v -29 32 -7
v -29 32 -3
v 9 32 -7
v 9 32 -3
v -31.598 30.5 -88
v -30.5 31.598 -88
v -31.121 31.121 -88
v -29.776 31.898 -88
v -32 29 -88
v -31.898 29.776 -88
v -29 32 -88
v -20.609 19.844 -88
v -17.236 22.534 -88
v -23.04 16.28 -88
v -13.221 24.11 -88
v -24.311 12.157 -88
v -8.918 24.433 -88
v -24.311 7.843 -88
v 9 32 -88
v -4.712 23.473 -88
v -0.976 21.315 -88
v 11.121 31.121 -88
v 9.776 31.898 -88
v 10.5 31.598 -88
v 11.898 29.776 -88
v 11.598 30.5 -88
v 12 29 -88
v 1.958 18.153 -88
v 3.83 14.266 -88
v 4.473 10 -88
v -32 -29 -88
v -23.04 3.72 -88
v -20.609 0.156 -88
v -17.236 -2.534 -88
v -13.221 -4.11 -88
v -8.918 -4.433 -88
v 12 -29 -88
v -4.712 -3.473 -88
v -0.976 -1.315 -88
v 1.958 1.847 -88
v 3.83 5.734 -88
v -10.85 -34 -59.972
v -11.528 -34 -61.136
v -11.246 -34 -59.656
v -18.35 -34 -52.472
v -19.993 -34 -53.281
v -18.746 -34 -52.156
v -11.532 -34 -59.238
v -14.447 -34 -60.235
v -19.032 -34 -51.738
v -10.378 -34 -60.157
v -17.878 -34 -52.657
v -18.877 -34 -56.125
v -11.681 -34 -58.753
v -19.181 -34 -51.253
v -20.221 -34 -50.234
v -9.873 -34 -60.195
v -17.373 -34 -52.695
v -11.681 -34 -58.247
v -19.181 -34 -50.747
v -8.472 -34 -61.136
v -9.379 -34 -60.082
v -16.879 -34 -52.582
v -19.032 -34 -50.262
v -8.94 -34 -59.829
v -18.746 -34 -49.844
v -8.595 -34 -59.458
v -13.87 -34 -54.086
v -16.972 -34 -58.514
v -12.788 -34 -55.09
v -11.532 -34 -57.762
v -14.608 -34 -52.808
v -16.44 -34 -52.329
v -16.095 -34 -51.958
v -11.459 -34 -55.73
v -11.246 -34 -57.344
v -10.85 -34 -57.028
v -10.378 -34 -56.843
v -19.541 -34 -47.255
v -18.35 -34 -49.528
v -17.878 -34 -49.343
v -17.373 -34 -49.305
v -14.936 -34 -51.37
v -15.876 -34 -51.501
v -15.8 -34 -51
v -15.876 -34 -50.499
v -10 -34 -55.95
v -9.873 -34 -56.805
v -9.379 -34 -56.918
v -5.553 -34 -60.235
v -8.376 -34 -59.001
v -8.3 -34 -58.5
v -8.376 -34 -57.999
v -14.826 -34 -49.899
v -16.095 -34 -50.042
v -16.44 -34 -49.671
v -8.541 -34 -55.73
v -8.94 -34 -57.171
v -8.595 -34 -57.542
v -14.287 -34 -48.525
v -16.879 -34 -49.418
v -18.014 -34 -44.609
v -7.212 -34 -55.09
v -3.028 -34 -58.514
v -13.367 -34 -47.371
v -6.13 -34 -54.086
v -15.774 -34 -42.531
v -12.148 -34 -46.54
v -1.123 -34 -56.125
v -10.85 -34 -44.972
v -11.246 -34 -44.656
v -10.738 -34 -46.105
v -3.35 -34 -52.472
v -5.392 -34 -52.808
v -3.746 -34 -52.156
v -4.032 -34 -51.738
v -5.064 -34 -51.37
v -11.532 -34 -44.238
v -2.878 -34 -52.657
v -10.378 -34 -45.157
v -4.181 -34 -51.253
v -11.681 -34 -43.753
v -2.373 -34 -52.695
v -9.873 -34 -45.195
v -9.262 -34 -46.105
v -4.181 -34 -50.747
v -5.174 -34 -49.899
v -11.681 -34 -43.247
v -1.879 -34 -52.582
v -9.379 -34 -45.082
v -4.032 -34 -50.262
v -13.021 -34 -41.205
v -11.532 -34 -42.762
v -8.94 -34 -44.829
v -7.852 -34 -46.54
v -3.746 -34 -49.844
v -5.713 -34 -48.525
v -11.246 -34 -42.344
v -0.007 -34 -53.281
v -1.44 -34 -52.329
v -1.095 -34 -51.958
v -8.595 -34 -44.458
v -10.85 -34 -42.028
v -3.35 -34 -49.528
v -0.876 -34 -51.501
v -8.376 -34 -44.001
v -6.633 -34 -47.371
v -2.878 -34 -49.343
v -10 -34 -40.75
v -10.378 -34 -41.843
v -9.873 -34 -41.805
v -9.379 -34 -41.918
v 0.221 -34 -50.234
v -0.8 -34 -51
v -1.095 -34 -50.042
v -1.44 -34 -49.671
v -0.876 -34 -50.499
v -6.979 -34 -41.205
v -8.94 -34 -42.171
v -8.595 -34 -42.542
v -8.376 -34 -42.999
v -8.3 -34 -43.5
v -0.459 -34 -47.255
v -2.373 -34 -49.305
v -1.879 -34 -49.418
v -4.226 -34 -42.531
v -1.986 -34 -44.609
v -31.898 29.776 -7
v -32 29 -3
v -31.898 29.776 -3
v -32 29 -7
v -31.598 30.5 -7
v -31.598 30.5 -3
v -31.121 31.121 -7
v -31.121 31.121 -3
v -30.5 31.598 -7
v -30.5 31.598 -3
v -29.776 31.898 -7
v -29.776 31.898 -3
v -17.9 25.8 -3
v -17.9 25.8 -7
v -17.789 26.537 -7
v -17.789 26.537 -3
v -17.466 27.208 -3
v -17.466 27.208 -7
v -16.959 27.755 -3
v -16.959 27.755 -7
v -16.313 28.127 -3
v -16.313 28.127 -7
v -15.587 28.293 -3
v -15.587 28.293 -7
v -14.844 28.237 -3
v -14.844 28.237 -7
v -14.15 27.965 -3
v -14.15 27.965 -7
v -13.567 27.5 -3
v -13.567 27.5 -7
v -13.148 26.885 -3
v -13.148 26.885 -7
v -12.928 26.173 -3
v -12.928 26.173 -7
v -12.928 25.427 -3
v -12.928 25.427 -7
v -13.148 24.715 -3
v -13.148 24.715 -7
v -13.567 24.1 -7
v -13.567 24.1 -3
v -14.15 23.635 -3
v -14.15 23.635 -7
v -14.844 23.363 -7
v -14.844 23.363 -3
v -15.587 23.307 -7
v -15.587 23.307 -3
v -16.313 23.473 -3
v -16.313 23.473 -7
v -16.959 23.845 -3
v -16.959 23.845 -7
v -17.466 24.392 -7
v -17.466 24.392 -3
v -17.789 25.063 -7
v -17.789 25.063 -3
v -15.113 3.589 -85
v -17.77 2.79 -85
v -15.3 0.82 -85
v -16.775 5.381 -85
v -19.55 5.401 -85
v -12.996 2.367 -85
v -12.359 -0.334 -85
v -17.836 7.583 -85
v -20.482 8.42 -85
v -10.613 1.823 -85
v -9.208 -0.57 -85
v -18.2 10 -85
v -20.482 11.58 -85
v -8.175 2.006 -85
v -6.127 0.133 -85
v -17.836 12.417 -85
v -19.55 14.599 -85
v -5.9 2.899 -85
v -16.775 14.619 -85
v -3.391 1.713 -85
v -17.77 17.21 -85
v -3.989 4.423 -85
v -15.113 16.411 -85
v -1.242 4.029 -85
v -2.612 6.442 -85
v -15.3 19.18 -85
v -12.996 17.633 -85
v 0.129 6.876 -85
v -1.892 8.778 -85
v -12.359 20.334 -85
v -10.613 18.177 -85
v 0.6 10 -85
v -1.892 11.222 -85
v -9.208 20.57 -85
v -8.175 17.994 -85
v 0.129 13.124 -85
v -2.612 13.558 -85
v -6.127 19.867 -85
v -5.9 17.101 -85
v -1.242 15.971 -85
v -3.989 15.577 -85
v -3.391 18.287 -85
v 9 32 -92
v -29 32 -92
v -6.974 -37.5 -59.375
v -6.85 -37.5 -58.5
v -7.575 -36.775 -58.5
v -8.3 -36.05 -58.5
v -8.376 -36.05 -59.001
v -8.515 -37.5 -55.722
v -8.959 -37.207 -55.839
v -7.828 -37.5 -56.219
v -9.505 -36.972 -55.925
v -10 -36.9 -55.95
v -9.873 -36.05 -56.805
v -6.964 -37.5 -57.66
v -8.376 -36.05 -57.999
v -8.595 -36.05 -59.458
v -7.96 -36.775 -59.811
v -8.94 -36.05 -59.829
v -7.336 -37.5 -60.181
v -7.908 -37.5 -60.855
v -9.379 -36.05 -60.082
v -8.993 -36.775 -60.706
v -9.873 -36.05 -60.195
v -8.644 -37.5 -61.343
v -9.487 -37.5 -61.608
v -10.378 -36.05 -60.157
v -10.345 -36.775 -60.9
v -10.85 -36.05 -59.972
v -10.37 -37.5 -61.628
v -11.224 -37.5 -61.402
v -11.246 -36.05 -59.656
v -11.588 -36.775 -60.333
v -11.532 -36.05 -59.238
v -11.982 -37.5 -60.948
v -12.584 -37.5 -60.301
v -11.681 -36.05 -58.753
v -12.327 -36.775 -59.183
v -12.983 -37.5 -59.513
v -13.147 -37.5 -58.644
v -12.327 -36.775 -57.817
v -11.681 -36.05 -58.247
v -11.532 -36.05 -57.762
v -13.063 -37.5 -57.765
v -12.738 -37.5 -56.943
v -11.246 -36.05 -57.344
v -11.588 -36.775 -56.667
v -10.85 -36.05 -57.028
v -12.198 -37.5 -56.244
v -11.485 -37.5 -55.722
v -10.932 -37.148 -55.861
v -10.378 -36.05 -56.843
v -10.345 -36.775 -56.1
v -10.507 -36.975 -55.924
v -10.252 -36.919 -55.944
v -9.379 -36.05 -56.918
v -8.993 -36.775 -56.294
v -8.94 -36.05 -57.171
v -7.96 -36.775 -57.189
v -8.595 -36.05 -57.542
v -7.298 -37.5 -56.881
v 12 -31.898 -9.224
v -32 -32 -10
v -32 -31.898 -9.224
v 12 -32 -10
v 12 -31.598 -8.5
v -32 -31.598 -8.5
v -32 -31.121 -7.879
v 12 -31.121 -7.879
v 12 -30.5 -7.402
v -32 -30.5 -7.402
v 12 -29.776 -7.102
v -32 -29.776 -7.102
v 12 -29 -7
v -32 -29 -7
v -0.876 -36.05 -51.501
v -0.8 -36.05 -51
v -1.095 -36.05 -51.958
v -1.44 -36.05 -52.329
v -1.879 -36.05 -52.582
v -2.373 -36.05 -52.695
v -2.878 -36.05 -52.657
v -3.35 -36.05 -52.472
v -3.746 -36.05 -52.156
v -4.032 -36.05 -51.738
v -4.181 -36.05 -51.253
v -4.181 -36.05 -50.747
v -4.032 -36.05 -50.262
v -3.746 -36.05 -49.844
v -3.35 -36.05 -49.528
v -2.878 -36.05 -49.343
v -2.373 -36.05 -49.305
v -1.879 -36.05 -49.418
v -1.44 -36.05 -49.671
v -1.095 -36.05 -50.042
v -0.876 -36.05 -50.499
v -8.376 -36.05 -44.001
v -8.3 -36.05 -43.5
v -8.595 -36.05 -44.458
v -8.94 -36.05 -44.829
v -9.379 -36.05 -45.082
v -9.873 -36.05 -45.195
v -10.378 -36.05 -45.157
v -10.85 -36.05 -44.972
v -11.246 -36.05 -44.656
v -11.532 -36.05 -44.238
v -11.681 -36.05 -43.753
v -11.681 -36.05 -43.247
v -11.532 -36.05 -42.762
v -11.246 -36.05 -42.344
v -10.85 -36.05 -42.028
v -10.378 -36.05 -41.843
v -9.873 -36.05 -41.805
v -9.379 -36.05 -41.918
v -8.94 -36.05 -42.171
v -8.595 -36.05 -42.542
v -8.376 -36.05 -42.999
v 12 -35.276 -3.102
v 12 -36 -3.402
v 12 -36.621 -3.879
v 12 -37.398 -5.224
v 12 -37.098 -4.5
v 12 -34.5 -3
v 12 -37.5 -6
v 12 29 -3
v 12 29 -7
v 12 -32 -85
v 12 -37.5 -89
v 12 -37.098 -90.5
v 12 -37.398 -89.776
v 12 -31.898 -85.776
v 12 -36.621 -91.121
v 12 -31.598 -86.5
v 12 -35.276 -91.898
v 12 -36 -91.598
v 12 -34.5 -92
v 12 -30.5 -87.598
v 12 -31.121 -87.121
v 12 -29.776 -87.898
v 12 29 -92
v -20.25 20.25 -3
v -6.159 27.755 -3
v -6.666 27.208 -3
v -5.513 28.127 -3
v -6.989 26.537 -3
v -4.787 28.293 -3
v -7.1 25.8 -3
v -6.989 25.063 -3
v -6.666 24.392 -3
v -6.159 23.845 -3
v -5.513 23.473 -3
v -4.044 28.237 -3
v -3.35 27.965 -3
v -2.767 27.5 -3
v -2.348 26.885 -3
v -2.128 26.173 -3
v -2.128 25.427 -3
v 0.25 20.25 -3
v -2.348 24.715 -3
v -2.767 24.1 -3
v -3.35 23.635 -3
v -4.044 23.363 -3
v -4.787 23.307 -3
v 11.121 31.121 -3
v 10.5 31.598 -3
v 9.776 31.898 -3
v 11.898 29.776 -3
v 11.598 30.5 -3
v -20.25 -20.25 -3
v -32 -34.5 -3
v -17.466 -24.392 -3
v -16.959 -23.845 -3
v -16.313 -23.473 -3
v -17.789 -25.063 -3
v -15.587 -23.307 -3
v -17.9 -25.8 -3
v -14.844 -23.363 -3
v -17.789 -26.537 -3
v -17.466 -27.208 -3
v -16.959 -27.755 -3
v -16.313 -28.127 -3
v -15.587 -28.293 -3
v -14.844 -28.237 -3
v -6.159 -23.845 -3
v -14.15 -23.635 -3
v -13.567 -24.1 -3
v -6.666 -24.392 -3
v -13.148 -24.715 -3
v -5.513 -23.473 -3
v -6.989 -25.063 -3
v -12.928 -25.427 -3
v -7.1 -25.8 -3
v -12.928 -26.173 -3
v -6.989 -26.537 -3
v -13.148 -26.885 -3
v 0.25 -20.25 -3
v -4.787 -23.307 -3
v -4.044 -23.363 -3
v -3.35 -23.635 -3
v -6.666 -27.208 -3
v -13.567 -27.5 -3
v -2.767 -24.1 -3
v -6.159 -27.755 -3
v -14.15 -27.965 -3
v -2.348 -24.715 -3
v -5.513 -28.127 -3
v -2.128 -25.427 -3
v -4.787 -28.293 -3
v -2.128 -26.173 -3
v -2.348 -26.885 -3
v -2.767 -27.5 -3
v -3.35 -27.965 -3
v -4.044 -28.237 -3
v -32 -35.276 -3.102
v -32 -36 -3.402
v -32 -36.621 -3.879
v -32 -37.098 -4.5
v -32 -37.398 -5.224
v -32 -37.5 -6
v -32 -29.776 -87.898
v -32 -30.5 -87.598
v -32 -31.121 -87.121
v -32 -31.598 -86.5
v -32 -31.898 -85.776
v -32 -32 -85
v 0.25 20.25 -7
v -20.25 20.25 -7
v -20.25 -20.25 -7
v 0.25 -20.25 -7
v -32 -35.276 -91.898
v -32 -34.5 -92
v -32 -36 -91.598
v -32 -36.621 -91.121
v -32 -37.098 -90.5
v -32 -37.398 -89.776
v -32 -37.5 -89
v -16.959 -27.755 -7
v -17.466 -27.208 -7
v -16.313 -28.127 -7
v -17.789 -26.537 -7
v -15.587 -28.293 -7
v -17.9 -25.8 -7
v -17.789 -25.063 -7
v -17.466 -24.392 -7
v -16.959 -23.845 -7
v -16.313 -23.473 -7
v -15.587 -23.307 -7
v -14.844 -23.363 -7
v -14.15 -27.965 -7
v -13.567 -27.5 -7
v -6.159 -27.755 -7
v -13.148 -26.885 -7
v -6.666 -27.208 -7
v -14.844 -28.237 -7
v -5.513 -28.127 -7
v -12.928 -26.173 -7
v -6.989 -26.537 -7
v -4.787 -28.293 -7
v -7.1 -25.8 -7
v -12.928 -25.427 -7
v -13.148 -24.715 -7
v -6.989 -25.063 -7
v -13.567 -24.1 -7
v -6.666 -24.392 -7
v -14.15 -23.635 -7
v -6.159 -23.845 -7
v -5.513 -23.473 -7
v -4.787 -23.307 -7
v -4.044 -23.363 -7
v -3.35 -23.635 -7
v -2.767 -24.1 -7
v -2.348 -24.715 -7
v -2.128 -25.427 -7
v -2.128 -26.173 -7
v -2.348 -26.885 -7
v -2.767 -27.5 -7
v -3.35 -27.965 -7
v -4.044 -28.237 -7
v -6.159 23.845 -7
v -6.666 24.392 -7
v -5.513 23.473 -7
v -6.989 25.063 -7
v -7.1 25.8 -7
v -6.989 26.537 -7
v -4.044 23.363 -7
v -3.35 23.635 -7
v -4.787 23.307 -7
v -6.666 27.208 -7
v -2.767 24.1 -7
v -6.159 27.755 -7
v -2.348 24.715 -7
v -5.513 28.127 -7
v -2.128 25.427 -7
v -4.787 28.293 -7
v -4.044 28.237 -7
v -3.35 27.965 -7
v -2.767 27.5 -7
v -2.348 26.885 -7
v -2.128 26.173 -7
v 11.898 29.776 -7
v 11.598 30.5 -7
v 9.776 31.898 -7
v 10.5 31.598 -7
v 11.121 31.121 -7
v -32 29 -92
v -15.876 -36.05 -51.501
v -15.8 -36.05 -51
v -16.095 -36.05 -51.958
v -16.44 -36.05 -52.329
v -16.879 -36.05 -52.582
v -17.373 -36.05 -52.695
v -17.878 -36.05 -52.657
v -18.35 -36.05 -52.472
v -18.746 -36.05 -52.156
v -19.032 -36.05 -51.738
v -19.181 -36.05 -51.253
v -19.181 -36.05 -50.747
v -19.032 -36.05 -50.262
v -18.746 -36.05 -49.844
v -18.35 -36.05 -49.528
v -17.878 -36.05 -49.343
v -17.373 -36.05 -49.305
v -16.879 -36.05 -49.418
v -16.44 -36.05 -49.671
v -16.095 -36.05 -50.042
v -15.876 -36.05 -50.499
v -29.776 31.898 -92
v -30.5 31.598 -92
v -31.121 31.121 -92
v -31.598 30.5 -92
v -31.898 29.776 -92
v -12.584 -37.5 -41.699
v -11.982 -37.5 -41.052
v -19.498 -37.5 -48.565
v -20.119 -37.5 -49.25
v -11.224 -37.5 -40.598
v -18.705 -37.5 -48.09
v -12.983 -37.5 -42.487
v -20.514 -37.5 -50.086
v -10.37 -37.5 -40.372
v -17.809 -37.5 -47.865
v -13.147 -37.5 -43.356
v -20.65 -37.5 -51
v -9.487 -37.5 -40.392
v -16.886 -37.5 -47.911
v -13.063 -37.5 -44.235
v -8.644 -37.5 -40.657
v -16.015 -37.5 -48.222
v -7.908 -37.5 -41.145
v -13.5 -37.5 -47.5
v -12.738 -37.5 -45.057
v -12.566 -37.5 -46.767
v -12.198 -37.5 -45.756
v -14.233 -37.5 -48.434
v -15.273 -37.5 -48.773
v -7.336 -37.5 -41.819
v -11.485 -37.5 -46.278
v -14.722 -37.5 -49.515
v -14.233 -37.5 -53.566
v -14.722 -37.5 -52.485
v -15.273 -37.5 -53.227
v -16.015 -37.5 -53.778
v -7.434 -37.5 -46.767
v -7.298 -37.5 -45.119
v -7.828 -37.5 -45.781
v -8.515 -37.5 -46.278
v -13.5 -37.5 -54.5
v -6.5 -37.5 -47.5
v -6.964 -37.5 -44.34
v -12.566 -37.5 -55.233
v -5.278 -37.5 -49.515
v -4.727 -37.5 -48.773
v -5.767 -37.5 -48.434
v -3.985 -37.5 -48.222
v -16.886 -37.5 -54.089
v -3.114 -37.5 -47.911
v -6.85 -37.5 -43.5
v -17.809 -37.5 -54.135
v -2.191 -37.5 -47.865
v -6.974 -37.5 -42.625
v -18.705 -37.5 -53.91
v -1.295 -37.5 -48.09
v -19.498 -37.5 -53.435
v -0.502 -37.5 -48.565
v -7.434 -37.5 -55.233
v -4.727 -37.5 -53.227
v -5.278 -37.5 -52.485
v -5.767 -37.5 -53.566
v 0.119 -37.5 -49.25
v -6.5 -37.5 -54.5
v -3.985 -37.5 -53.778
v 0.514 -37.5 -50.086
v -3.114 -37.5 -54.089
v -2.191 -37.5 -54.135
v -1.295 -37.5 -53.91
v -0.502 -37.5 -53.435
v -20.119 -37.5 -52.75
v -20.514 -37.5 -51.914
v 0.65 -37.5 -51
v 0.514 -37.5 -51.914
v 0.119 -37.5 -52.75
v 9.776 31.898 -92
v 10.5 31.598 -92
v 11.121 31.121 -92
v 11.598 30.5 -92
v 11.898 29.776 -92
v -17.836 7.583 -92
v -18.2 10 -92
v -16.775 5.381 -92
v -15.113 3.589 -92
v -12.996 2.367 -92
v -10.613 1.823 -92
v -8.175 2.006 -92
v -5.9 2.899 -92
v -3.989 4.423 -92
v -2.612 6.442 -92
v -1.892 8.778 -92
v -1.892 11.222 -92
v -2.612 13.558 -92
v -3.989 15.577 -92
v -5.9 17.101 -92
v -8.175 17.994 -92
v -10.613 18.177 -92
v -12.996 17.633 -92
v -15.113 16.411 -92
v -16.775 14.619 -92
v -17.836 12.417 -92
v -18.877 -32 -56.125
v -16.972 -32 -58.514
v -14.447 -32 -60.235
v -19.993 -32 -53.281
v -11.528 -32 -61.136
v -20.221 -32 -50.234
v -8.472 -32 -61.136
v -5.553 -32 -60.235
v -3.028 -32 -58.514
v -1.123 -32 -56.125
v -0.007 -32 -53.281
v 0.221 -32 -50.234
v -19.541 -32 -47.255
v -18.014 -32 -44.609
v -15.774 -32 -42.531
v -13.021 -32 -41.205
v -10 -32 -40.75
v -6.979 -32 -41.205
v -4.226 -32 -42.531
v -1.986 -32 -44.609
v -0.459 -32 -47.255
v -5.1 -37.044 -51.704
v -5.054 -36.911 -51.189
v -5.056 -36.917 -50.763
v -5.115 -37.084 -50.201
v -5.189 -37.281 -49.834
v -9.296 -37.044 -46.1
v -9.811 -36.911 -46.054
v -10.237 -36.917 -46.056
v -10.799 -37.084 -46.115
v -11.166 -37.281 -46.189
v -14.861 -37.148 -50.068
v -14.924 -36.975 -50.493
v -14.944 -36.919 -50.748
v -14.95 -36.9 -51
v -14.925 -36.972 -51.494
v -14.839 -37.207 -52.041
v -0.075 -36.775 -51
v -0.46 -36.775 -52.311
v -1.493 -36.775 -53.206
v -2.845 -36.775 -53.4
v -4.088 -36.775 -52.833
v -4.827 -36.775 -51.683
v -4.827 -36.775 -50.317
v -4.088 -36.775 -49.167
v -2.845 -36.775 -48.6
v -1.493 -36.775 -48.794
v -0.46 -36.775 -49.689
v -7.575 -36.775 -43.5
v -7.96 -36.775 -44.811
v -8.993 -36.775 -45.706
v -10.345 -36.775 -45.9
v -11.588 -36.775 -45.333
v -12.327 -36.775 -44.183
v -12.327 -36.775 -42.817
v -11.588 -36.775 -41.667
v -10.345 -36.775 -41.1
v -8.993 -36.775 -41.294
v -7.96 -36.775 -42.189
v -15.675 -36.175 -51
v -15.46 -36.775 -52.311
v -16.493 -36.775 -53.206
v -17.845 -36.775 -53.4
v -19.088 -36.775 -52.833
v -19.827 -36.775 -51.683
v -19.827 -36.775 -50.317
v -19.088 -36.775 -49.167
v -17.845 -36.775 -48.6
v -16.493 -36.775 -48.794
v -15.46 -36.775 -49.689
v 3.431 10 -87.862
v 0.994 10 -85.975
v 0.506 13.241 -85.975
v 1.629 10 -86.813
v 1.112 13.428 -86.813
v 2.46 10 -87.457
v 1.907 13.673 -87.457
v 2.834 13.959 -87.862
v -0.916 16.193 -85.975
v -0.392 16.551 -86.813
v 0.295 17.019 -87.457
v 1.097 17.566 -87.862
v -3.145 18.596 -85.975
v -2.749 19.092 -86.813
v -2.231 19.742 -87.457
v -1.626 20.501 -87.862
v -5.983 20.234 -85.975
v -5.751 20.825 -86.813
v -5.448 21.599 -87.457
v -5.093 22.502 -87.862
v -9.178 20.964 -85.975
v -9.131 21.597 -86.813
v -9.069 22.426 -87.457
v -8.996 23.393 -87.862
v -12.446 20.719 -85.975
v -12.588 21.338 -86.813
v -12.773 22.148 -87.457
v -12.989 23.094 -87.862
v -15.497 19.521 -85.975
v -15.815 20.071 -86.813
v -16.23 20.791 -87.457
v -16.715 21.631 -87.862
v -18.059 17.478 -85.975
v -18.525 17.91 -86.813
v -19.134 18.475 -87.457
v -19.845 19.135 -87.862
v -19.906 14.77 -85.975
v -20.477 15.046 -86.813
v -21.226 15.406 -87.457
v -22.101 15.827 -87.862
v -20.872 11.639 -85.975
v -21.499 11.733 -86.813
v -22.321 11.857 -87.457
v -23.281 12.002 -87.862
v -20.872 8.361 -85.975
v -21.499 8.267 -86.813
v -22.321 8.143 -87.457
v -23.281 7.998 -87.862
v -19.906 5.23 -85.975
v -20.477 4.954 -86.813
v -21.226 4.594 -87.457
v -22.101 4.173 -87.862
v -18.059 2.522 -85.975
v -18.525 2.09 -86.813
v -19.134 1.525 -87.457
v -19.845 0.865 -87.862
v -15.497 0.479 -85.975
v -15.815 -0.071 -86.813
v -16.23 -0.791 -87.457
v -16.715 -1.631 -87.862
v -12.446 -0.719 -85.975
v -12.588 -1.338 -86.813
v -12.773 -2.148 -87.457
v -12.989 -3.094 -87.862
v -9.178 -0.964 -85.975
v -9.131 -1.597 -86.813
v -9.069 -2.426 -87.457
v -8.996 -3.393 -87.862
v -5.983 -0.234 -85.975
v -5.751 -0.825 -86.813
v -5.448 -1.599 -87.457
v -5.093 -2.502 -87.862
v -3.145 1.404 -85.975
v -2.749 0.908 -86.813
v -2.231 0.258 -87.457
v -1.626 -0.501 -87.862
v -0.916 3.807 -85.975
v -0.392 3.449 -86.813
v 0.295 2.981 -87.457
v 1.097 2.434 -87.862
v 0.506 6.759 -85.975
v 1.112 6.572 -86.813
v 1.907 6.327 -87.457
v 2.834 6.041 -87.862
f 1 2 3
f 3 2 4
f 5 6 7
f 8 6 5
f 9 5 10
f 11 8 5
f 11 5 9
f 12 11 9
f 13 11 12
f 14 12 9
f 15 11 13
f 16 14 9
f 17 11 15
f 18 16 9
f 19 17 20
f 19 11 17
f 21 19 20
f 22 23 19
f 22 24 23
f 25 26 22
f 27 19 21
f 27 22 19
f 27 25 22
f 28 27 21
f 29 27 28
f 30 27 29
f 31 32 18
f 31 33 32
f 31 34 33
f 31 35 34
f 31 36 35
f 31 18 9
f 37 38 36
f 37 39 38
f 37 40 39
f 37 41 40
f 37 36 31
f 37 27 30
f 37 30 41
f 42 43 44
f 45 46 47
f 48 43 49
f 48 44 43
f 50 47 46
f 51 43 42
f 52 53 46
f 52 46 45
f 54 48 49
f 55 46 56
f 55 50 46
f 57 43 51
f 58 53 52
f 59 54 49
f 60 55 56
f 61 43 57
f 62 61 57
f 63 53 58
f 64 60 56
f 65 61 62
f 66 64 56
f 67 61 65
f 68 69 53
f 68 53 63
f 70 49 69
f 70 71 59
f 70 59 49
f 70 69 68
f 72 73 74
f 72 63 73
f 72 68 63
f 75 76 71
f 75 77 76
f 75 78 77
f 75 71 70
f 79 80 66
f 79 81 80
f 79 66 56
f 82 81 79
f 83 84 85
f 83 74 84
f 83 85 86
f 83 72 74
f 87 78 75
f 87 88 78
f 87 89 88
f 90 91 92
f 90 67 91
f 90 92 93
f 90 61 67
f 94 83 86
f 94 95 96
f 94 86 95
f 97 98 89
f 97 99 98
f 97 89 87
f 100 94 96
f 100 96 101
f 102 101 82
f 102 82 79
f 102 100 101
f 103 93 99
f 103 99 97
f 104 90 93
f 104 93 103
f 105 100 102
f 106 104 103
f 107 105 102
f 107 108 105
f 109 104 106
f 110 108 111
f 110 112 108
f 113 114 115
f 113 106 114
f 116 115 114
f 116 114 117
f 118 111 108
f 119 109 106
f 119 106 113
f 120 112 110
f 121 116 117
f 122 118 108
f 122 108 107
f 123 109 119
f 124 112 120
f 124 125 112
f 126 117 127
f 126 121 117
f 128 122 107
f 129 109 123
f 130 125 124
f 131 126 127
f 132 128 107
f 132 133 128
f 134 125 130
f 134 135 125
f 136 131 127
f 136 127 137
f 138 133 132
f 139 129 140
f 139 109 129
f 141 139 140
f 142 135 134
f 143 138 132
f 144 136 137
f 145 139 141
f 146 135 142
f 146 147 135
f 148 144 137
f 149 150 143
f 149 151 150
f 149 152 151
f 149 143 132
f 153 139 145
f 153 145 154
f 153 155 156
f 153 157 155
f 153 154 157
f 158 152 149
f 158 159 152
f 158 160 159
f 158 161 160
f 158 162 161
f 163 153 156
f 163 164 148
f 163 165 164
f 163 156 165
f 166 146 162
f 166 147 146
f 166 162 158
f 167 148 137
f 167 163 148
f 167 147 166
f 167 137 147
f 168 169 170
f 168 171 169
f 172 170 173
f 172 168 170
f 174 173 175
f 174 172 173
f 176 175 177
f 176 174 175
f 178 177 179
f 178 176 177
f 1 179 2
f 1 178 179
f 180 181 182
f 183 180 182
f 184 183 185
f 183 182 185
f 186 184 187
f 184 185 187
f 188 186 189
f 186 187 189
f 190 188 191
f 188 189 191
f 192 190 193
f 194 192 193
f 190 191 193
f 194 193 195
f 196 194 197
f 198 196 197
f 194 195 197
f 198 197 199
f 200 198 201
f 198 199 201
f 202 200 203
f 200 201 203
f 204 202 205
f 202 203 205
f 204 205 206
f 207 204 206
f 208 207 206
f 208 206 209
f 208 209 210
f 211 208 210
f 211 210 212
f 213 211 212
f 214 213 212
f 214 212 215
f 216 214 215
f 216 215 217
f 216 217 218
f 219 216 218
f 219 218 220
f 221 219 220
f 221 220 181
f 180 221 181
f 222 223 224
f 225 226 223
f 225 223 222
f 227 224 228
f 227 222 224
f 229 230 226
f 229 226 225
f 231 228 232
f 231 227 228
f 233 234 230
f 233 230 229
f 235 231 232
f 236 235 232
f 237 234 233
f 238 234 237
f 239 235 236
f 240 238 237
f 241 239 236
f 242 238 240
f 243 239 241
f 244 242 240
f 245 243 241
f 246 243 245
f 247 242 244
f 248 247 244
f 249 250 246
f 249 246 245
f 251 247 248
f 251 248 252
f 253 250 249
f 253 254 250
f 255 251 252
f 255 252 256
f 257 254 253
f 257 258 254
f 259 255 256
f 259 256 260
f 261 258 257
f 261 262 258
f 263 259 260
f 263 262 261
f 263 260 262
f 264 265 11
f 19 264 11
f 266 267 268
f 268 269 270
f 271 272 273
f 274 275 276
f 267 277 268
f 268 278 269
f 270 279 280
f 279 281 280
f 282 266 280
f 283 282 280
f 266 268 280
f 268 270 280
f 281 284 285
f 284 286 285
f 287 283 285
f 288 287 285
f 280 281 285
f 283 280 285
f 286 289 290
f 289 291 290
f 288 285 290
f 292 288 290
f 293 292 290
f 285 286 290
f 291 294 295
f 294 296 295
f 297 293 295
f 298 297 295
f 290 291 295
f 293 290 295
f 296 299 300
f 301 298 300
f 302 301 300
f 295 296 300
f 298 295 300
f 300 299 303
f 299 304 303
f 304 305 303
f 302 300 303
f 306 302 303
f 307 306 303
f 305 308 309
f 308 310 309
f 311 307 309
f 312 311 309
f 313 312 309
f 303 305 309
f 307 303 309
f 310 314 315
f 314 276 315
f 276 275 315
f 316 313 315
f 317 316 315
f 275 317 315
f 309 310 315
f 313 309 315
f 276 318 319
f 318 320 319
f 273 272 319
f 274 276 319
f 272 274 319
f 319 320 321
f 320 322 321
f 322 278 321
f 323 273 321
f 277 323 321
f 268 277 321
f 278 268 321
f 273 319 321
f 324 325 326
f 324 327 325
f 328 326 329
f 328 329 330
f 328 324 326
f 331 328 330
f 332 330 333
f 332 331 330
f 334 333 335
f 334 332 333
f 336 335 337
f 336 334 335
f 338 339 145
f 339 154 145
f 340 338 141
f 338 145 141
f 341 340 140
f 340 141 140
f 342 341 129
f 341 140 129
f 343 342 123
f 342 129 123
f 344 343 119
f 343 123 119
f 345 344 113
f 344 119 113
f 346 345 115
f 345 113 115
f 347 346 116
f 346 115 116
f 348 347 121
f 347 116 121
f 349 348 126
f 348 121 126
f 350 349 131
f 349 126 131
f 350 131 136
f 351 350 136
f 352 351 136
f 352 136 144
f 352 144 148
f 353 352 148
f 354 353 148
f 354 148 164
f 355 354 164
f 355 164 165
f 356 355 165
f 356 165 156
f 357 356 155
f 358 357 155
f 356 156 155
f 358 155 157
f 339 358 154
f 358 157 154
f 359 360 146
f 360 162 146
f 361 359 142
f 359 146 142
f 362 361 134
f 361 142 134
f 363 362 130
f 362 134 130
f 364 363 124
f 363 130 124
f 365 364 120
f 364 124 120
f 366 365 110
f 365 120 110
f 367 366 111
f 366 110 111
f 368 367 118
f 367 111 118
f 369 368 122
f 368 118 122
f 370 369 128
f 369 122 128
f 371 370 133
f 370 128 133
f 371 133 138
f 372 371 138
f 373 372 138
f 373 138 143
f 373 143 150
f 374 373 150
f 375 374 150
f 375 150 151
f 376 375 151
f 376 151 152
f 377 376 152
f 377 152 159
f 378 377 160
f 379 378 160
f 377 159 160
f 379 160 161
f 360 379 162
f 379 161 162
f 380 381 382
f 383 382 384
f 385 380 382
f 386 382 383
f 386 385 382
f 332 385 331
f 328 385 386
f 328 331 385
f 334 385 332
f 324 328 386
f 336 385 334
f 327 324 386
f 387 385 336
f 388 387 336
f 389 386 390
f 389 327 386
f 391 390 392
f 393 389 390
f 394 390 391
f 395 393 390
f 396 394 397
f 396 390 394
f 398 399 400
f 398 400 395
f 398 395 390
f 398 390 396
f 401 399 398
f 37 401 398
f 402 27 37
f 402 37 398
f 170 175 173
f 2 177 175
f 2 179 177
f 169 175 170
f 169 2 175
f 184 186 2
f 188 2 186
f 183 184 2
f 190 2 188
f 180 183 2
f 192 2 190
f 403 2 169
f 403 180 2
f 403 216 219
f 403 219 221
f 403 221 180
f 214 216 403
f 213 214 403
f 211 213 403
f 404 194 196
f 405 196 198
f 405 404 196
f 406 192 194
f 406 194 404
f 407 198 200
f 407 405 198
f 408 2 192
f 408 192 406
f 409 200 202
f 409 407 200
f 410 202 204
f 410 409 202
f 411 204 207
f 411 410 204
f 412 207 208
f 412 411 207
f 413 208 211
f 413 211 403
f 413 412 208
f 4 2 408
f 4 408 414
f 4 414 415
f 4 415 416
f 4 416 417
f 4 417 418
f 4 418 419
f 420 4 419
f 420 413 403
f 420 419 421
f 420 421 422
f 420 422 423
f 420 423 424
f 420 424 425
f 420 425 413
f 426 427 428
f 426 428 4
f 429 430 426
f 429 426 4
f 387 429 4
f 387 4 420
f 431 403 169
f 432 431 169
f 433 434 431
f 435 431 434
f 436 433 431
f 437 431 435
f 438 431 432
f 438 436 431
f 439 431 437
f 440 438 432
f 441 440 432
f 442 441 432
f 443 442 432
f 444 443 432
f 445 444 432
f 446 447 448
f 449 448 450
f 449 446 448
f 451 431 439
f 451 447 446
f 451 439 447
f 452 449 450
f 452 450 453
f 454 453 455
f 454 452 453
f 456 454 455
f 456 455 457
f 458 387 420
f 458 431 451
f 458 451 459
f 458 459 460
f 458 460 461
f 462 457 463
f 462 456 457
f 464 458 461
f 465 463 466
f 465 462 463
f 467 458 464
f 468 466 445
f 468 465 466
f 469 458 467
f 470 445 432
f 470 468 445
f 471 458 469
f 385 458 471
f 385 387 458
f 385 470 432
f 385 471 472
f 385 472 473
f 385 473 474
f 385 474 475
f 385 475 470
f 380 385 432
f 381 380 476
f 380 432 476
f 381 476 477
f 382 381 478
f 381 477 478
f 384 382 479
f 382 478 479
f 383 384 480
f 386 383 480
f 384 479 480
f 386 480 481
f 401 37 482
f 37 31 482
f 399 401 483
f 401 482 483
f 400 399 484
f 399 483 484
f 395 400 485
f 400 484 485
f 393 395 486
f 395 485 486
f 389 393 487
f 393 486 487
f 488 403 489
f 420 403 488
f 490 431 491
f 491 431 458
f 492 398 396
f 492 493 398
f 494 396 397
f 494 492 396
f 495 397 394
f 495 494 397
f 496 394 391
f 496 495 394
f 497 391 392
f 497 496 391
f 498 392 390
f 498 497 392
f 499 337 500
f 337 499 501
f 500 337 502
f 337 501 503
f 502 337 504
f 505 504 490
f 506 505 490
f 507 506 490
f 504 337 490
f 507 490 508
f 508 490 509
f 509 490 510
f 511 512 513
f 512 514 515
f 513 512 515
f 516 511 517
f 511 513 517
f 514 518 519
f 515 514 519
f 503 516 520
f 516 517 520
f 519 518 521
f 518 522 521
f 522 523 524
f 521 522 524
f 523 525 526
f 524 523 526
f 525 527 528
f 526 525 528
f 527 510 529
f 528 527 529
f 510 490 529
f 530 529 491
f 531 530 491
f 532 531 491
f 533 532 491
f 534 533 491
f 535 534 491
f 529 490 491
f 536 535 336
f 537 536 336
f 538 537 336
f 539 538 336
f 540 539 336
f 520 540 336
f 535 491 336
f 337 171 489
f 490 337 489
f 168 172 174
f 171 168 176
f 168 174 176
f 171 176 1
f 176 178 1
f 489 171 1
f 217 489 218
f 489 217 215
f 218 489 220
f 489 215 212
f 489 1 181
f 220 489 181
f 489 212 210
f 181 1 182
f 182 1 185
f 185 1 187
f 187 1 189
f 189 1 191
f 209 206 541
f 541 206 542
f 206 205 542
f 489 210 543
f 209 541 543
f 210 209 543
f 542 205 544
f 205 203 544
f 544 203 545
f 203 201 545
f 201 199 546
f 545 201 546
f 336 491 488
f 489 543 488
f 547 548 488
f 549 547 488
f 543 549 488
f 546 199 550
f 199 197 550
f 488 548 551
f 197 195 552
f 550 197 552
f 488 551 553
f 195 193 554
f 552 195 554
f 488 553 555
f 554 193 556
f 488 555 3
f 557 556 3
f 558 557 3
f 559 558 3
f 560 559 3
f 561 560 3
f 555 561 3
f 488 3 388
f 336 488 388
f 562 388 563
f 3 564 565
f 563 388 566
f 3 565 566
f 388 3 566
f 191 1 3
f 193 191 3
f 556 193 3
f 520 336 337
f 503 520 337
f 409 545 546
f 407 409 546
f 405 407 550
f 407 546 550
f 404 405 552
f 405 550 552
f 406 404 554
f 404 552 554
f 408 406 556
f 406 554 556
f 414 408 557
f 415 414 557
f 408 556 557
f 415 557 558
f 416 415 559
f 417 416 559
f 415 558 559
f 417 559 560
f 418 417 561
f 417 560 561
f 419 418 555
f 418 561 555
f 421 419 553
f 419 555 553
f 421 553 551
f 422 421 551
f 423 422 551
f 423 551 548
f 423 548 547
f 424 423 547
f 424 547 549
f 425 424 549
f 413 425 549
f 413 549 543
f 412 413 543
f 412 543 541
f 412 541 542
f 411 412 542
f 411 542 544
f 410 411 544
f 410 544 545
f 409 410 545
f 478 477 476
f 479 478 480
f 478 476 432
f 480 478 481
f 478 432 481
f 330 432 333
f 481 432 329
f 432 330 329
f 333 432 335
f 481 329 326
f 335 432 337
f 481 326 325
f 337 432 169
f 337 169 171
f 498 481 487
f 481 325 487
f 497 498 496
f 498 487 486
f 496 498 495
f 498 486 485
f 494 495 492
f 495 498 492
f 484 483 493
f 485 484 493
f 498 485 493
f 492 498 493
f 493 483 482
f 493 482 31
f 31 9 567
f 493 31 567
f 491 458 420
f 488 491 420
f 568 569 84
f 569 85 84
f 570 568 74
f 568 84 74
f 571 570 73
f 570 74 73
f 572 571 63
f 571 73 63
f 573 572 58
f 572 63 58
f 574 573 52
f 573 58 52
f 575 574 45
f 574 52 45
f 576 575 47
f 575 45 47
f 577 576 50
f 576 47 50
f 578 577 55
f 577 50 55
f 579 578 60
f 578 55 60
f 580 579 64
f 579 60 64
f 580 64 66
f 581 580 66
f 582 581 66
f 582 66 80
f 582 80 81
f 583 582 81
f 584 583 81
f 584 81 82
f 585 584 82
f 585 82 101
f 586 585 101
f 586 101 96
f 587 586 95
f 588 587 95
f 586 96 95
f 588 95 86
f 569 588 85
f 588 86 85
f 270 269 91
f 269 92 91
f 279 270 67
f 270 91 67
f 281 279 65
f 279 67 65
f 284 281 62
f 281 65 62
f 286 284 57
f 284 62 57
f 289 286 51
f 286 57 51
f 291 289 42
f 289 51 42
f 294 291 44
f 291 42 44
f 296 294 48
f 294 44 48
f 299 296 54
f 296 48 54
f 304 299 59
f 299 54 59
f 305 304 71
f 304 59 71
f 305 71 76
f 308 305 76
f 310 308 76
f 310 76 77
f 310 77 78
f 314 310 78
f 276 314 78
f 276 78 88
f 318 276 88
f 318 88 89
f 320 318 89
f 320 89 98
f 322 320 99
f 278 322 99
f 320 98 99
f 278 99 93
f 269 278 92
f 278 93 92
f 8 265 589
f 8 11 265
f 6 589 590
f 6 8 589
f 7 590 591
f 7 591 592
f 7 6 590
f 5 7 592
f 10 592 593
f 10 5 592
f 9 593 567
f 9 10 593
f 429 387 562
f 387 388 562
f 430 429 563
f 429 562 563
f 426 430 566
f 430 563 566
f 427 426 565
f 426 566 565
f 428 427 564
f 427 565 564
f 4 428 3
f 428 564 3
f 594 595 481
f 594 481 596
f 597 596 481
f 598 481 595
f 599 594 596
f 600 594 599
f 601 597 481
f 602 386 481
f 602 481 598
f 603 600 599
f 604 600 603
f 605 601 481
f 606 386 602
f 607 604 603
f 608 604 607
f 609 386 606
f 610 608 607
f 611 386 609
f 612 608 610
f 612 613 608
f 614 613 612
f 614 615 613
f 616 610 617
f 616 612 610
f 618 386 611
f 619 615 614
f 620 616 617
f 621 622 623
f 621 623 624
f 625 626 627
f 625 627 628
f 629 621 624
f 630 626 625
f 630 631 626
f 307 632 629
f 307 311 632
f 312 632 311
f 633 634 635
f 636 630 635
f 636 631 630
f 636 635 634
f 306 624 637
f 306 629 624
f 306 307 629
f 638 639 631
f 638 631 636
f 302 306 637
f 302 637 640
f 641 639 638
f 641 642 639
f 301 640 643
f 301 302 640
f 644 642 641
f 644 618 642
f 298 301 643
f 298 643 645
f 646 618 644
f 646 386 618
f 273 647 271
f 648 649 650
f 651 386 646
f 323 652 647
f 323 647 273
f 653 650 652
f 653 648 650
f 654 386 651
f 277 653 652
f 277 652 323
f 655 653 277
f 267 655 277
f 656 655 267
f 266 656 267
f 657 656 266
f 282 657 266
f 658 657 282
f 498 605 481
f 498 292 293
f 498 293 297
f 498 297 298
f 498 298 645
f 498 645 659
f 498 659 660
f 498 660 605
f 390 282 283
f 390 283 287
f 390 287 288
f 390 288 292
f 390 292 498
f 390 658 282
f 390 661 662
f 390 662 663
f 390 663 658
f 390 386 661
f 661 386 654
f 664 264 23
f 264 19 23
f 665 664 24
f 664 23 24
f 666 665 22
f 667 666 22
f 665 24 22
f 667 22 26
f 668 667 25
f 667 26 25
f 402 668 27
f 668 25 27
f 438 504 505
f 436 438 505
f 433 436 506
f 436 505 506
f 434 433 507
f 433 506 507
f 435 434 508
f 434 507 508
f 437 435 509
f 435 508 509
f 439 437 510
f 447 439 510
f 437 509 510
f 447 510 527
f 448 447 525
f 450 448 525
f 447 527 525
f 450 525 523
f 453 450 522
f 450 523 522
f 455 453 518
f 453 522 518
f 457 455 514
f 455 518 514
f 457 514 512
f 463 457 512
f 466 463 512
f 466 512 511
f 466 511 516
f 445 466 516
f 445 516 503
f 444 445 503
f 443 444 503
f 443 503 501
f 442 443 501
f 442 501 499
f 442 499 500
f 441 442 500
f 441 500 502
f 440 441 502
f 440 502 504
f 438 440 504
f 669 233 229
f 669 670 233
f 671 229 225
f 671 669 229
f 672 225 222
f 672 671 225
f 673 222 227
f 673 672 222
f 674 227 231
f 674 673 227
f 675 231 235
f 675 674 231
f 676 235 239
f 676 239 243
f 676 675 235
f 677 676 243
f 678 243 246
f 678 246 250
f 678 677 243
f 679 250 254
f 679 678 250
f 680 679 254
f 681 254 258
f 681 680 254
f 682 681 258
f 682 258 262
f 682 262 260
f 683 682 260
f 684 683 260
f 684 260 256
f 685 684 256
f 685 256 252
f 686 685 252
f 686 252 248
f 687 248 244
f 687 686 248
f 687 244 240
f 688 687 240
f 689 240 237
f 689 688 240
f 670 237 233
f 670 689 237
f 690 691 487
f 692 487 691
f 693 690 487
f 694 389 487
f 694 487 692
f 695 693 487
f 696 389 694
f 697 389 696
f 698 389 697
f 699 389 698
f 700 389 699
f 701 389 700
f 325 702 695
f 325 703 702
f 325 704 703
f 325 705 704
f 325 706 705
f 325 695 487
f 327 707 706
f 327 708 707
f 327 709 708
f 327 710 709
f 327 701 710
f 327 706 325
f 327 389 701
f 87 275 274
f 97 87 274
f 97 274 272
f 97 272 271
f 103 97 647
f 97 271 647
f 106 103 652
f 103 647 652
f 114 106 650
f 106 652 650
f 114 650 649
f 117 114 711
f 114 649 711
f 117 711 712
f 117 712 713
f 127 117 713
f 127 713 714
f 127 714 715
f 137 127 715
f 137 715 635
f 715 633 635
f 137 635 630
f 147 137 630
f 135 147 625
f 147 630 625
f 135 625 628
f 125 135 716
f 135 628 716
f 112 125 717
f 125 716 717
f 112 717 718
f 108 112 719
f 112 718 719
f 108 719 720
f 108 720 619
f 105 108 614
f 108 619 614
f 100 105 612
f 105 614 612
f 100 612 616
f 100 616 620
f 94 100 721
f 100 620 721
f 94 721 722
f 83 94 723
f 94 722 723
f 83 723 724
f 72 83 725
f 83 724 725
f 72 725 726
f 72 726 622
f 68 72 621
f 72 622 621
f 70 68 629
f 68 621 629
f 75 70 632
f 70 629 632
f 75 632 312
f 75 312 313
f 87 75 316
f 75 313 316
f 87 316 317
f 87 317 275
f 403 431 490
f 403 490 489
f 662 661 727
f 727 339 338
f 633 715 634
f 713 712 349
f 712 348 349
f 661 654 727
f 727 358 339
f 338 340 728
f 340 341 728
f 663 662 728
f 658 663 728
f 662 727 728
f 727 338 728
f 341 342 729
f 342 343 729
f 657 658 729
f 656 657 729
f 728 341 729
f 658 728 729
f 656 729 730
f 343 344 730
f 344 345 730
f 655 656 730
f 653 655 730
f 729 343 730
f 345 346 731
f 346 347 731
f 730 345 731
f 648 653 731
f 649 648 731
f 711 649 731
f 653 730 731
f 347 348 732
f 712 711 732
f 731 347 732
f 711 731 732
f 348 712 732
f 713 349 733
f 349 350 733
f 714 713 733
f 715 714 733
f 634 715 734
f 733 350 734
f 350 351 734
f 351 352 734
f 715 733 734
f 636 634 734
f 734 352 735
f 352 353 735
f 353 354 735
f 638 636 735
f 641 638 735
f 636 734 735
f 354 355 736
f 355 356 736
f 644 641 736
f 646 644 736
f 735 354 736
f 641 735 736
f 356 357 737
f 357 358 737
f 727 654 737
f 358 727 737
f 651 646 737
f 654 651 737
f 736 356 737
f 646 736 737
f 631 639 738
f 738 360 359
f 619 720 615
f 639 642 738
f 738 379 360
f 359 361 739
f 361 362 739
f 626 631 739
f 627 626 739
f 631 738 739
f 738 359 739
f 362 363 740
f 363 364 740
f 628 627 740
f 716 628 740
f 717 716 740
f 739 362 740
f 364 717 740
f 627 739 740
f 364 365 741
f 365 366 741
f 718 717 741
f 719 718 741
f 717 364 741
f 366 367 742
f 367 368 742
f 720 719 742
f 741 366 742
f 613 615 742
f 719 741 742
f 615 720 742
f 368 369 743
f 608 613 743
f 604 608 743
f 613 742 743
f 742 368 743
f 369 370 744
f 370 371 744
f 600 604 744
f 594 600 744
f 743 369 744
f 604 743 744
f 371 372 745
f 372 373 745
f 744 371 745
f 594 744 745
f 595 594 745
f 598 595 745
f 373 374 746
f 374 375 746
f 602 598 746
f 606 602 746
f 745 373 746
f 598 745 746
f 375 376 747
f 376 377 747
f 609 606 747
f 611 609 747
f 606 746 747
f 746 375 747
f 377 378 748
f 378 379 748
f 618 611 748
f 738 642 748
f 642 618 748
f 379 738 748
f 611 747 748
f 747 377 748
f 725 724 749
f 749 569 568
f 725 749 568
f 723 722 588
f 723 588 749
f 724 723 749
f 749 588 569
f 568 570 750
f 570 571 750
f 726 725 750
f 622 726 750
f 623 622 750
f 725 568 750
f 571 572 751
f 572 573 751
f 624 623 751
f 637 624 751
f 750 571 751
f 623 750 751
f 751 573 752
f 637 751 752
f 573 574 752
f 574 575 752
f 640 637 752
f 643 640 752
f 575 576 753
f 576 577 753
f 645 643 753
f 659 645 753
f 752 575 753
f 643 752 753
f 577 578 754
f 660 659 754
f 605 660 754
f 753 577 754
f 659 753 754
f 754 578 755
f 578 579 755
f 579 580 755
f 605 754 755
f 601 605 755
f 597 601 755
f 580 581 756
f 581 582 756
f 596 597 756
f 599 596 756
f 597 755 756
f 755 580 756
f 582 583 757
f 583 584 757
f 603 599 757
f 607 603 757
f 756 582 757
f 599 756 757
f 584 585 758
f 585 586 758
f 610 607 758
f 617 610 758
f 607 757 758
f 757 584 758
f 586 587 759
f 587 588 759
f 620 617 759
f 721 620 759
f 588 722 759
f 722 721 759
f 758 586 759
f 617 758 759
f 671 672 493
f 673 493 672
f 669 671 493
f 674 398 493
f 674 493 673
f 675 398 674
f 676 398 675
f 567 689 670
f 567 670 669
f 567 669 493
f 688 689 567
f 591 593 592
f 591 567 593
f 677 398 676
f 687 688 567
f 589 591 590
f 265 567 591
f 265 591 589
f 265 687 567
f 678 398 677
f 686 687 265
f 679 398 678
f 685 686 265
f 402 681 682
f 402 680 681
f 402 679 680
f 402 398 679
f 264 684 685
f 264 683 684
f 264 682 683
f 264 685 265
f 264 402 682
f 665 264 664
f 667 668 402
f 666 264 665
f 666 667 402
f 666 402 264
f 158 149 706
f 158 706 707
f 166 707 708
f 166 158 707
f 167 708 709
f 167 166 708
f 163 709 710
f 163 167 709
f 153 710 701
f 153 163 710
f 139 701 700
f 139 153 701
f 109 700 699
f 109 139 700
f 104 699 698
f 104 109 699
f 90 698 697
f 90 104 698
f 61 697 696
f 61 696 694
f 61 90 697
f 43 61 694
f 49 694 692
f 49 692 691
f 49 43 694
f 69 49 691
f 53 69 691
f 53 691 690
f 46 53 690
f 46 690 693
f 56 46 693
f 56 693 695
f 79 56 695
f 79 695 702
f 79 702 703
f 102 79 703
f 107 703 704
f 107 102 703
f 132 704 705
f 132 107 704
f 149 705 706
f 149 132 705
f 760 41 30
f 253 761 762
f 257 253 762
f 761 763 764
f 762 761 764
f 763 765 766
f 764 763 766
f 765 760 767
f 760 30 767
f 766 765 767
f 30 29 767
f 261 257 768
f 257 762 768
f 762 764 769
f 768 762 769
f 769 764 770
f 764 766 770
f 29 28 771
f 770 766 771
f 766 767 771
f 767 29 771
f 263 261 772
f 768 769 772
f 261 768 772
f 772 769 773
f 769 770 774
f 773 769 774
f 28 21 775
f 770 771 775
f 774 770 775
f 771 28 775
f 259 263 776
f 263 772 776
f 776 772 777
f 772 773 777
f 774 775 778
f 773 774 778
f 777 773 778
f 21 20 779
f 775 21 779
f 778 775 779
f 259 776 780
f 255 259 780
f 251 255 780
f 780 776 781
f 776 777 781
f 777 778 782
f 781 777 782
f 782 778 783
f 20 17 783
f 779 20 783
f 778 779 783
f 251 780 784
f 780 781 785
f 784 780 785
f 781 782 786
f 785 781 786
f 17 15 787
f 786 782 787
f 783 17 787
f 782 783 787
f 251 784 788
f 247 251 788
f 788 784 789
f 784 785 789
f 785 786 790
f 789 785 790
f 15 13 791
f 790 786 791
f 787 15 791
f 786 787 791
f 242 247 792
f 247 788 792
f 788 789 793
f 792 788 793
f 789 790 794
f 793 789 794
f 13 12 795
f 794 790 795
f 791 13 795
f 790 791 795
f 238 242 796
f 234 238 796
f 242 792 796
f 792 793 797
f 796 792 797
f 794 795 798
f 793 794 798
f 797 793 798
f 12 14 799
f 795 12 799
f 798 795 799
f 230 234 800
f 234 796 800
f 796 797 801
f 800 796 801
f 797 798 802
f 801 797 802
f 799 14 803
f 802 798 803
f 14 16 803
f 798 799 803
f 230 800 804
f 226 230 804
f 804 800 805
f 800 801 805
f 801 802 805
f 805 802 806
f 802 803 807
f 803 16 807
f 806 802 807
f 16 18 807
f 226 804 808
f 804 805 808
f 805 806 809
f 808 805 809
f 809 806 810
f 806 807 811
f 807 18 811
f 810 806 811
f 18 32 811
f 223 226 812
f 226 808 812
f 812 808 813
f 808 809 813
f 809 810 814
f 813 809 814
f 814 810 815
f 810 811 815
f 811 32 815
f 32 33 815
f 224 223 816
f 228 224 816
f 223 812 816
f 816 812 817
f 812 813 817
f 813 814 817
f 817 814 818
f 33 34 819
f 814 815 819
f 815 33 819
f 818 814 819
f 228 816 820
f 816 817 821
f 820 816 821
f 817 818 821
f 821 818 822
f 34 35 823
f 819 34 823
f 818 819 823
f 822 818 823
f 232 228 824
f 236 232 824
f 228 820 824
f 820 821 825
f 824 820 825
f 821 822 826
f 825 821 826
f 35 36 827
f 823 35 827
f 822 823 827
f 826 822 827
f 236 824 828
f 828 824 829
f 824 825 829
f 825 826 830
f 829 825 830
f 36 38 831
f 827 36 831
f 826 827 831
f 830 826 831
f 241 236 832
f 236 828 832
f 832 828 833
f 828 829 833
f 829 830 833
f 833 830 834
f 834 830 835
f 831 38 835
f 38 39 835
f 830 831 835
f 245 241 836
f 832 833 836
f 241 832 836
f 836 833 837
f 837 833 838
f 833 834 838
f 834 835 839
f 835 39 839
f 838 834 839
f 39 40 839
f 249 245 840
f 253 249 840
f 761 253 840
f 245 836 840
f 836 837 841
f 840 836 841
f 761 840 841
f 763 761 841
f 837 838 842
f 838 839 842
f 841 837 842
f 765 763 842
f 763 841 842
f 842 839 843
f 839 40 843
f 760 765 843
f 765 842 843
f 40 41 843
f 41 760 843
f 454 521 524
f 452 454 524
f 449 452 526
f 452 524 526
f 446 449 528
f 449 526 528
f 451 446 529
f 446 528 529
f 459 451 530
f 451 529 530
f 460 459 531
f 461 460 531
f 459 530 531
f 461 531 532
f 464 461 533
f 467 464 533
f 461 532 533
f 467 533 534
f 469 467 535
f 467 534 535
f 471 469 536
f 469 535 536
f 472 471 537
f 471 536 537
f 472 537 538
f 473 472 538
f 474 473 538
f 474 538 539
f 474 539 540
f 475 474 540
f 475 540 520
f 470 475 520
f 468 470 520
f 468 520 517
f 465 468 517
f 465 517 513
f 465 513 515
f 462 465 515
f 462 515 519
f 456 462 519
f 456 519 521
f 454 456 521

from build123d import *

# Parameters (mm, degrees)
BOSS_EXTRU_1_START                             = -3
ESQUISSE1_W                                    = 44
ESQUISSE1_H                                    = 64
ESQUISSE1_W_2                                  = 20.5
ESQUISSE1_H_2                                  = 40.5
BOSS_EXTRU_1_DEPTH                             = 4
BOSS_EXTRU_2_DEPTH                             = 44
ENL_V_MAT_EXTRU_1_REACH                        = 103.741
ESQUISSE3_R                                    = 8.2
ESQUISSE4_R                                    = 10.6
ESQUISSE4_R_2                                  = 8.2
BOSS_EXTRU_3_DEPTH                             = 3
CONG_1_R                                       = 4
CONG_2_R                                       = 3
ENL_V_MAT_EXTRU_2_REACH                        = 100.261
ESQUISSE5_R                                    = 2.5
ENL_V_START                                    = -2
ESQUISSE6_R                                    = 10.25
ENL_V_MAT_EXTRU_3_DEPTH                        = 2
ENL_V_MAT_EXTRU_4_REACH                        = 121.659
ESQUISSE7_R                                    = 4.95
FRAISAGE_POUR_VIS_T_TE_FRAIS_E_M31_D           = 3.4
FRAISAGE_POUR_VIS_T_TE_FRAIS_E_M31_CSINK_D     = 6.3
FRAISAGE_POUR_VIS_T_TE_FRAIS_E_M31_CSINK_ANGLE = 90


with BuildPart() as part:
    # Esquisse1 → Boss.-Extru.1 (new body)
    with BuildSketch(Plane.XY.offset(BOSS_EXTRU_1_START)):
        with Locations((-10, 0)):
            Rectangle(ESQUISSE1_W, ESQUISSE1_H)
        with Locations((-10, 0)):
            Rectangle(ESQUISSE1_W_2, ESQUISSE1_H_2, mode=Mode.SUBTRACT)
    extrude(amount=-BOSS_EXTRU_1_DEPTH)

    # Esquisse2 → Boss.-Extru.2 (add)
    with BuildSketch(Plane(origin=(12, 0, 0), x_dir=(0, 0, -1), z_dir=(1, 0, 0))):
        Polygon((3, -37.5), (92, -37.5), (92, 32), (88, 32), (88, -32), (7, -32), (7, -28.443383769), (3, -28.443383769), (3, -32), align=None)
    extrude(amount=-BOSS_EXTRU_2_DEPTH)

    # Esquisse3 → Enlèv. mat.-Extru.1 (cut, up to next)
    with BuildSketch(Plane(origin=(0, 0, -92), x_dir=(-1, 0, 0), z_dir=(0, 0, -1)), mode=Mode.PRIVATE) as enl_v_mat_extru_1_sk1:
        with Locations((10, 10)):
            Circle(ESQUISSE3_R)
    enl_v_mat_extru_1_tool1 = extrude(enl_v_mat_extru_1_sk1.sketch, amount=-ENL_V_MAT_EXTRU_1_REACH, mode=Mode.PRIVATE) & part.part
    add(enl_v_mat_extru_1_tool1.solids().sort_by_distance((-10, 10, -92))[0], mode=Mode.SUBTRACT)

    # Esquisse4 → Boss.-Extru.3 (add)
    with BuildSketch(Plane.XY.offset(-88)):
        with Locations((-10, 10)):
            Circle(ESQUISSE4_R)
        with Locations(Location((-10, 10, 0), (0, 0, 180))):
            Circle(ESQUISSE4_R_2, mode=Mode.SUBTRACT)
    extrude(amount=BOSS_EXTRU_3_DEPTH)

    # Congé1
    # the kernel refuses this fillet: 4 mm, written as the material it adds along each edge
    with BuildSketch(Plane(origin=(-10, 10, -88), x_dir=(1, 0, 0), z_dir=(0, -1, 0))) as cong_1_piece_1:
        with BuildLine():
            CenterArc((14.472983346, 4), CONG_1_R, 194.477512186, 75.522487814)
            Line((10.6, 3), (10.522540333, 2.98))
            ThreePointArc((10.522540333, 2.98), (10.52, 1.5), (10.52, 0))
            Line((10.52, 0), (10.6, -0.08))
            Line((10.6, -0.08), (14.472983346, -0.08))
            Line((14.472983346, -0.08), (14.472983346, 0))
        make_face()
    revolve(axis=Axis((-10, 10, -88), (0, 0, 1)))

    # Congé2
    cong_2_edges = [part.edges().sort_by_distance(p)[0] for p in [
        (12, 32, -90),
        (-32, 32, -90),
        (-10, -32, -88),
        (-10, -37.5, -3),
        (-10, -37.5, -92),
        (-10, -32, -7),
        (-32, 32, -5),
        (12, 32, -5),
    ]]
    fillet(cong_2_edges, radius=CONG_2_R)

    # Esquisse5 → Enlèv. mat.-Extru.2 (cut, up to next)
    with BuildSketch(Plane(origin=(0, 0, -7), x_dir=(-1, 0, 0), z_dir=(0, 0, -1)), mode=Mode.PRIVATE) as enl_v_mat_extru_2_sk1:
        with Locations((4.6, 25.8)):
            Circle(ESQUISSE5_R)
    enl_v_mat_extru_2_tool1 = extrude(enl_v_mat_extru_2_sk1.sketch, amount=-ENL_V_MAT_EXTRU_2_REACH, mode=Mode.PRIVATE) & part.part
    # Esquisse5 → Enlèv. mat.-Extru.2 (cut, up to next)
    with BuildSketch(Plane(origin=(0, 0, -7), x_dir=(-1, 0, 0), z_dir=(0, 0, -1)), mode=Mode.PRIVATE) as enl_v_mat_extru_2_sk2:
        with Locations((15.4, 25.8)):
            Circle(ESQUISSE5_R)
    enl_v_mat_extru_2_tool2 = extrude(enl_v_mat_extru_2_sk2.sketch, amount=-ENL_V_MAT_EXTRU_2_REACH, mode=Mode.PRIVATE) & part.part
    # Esquisse5 → Enlèv. mat.-Extru.2 (cut, up to next)
    with BuildSketch(Plane(origin=(0, 0, -7), x_dir=(-1, 0, 0), z_dir=(0, 0, -1)), mode=Mode.PRIVATE) as enl_v_mat_extru_2_sk3:
        with Locations((4.6, -25.8)):
            Circle(ESQUISSE5_R)
    enl_v_mat_extru_2_tool3 = extrude(enl_v_mat_extru_2_sk3.sketch, amount=-ENL_V_MAT_EXTRU_2_REACH, mode=Mode.PRIVATE) & part.part
    # Esquisse5 → Enlèv. mat.-Extru.2 (cut, up to next)
    with BuildSketch(Plane(origin=(0, 0, -7), x_dir=(-1, 0, 0), z_dir=(0, 0, -1)), mode=Mode.PRIVATE) as enl_v_mat_extru_2_sk4:
        with Locations((15.4, -25.8)):
            Circle(ESQUISSE5_R)
    enl_v_mat_extru_2_tool4 = extrude(enl_v_mat_extru_2_sk4.sketch, amount=-ENL_V_MAT_EXTRU_2_REACH, mode=Mode.PRIVATE) & part.part
    add(enl_v_mat_extru_2_tool1.solids().sort_by_distance((-4.6, 25.8, -7))[0], mode=Mode.SUBTRACT)
    add(enl_v_mat_extru_2_tool2.solids().sort_by_distance((-15.4, 25.8, -7))[0], mode=Mode.SUBTRACT)
    add(enl_v_mat_extru_2_tool3.solids().sort_by_distance((-4.6, -25.8, -7))[0], mode=Mode.SUBTRACT)
    add(enl_v_mat_extru_2_tool4.solids().sort_by_distance((-15.4, -25.8, -7))[0], mode=Mode.SUBTRACT)

    # Esquisse6 → Enlèv. mat.-Extru.3 (cut)
    with BuildSketch(Plane(origin=(0, -32, 0), x_dir=(1, 0, 0), z_dir=(0, 1, 0)).offset(ENL_V_START)):
        with Locations(Location((-10, 51, 0), (0, 0, 270))):
            Circle(ESQUISSE6_R)
    extrude(amount=ENL_V_MAT_EXTRU_3_DEPTH, mode=Mode.SUBTRACT)

    # Esquisse7 → Enlèv. mat.-Extru.4 (cut, up to next)
    with BuildSketch(Plane.XZ.offset(37.5), mode=Mode.PRIVATE) as enl_v_mat_extru_4_sk1:
        with Locations(Location((-10, -51, 0), (0, 0, 270))):
            Circle(ESQUISSE7_R)
    enl_v_mat_extru_4_tool1 = extrude(enl_v_mat_extru_4_sk1.sketch, amount=-ENL_V_MAT_EXTRU_4_REACH, mode=Mode.PRIVATE) & part.part
    add(enl_v_mat_extru_4_tool1.solids().sort_by_distance((-10, -37.5, -51))[0], mode=Mode.SUBTRACT)

    # Fraisage pour vis à tête fraisée M31 (through all)
    with Locations(Plane(origin=(0, -37.5, 0), x_dir=(-1, 0, 0), z_dir=(0, -1, 0))):
        with Locations((10, 58.5), (17.5, 51), (10, 43.5), (2.5, 51)):
            CounterSinkHole(FRAISAGE_POUR_VIS_T_TE_FRAIS_E_M31_D / 2, FRAISAGE_POUR_VIS_T_TE_FRAIS_E_M31_CSINK_D / 2, counter_sink_angle=FRAISAGE_POUR_VIS_T_TE_FRAIS_E_M31_CSINK_ANGLE)


solid = part.part
